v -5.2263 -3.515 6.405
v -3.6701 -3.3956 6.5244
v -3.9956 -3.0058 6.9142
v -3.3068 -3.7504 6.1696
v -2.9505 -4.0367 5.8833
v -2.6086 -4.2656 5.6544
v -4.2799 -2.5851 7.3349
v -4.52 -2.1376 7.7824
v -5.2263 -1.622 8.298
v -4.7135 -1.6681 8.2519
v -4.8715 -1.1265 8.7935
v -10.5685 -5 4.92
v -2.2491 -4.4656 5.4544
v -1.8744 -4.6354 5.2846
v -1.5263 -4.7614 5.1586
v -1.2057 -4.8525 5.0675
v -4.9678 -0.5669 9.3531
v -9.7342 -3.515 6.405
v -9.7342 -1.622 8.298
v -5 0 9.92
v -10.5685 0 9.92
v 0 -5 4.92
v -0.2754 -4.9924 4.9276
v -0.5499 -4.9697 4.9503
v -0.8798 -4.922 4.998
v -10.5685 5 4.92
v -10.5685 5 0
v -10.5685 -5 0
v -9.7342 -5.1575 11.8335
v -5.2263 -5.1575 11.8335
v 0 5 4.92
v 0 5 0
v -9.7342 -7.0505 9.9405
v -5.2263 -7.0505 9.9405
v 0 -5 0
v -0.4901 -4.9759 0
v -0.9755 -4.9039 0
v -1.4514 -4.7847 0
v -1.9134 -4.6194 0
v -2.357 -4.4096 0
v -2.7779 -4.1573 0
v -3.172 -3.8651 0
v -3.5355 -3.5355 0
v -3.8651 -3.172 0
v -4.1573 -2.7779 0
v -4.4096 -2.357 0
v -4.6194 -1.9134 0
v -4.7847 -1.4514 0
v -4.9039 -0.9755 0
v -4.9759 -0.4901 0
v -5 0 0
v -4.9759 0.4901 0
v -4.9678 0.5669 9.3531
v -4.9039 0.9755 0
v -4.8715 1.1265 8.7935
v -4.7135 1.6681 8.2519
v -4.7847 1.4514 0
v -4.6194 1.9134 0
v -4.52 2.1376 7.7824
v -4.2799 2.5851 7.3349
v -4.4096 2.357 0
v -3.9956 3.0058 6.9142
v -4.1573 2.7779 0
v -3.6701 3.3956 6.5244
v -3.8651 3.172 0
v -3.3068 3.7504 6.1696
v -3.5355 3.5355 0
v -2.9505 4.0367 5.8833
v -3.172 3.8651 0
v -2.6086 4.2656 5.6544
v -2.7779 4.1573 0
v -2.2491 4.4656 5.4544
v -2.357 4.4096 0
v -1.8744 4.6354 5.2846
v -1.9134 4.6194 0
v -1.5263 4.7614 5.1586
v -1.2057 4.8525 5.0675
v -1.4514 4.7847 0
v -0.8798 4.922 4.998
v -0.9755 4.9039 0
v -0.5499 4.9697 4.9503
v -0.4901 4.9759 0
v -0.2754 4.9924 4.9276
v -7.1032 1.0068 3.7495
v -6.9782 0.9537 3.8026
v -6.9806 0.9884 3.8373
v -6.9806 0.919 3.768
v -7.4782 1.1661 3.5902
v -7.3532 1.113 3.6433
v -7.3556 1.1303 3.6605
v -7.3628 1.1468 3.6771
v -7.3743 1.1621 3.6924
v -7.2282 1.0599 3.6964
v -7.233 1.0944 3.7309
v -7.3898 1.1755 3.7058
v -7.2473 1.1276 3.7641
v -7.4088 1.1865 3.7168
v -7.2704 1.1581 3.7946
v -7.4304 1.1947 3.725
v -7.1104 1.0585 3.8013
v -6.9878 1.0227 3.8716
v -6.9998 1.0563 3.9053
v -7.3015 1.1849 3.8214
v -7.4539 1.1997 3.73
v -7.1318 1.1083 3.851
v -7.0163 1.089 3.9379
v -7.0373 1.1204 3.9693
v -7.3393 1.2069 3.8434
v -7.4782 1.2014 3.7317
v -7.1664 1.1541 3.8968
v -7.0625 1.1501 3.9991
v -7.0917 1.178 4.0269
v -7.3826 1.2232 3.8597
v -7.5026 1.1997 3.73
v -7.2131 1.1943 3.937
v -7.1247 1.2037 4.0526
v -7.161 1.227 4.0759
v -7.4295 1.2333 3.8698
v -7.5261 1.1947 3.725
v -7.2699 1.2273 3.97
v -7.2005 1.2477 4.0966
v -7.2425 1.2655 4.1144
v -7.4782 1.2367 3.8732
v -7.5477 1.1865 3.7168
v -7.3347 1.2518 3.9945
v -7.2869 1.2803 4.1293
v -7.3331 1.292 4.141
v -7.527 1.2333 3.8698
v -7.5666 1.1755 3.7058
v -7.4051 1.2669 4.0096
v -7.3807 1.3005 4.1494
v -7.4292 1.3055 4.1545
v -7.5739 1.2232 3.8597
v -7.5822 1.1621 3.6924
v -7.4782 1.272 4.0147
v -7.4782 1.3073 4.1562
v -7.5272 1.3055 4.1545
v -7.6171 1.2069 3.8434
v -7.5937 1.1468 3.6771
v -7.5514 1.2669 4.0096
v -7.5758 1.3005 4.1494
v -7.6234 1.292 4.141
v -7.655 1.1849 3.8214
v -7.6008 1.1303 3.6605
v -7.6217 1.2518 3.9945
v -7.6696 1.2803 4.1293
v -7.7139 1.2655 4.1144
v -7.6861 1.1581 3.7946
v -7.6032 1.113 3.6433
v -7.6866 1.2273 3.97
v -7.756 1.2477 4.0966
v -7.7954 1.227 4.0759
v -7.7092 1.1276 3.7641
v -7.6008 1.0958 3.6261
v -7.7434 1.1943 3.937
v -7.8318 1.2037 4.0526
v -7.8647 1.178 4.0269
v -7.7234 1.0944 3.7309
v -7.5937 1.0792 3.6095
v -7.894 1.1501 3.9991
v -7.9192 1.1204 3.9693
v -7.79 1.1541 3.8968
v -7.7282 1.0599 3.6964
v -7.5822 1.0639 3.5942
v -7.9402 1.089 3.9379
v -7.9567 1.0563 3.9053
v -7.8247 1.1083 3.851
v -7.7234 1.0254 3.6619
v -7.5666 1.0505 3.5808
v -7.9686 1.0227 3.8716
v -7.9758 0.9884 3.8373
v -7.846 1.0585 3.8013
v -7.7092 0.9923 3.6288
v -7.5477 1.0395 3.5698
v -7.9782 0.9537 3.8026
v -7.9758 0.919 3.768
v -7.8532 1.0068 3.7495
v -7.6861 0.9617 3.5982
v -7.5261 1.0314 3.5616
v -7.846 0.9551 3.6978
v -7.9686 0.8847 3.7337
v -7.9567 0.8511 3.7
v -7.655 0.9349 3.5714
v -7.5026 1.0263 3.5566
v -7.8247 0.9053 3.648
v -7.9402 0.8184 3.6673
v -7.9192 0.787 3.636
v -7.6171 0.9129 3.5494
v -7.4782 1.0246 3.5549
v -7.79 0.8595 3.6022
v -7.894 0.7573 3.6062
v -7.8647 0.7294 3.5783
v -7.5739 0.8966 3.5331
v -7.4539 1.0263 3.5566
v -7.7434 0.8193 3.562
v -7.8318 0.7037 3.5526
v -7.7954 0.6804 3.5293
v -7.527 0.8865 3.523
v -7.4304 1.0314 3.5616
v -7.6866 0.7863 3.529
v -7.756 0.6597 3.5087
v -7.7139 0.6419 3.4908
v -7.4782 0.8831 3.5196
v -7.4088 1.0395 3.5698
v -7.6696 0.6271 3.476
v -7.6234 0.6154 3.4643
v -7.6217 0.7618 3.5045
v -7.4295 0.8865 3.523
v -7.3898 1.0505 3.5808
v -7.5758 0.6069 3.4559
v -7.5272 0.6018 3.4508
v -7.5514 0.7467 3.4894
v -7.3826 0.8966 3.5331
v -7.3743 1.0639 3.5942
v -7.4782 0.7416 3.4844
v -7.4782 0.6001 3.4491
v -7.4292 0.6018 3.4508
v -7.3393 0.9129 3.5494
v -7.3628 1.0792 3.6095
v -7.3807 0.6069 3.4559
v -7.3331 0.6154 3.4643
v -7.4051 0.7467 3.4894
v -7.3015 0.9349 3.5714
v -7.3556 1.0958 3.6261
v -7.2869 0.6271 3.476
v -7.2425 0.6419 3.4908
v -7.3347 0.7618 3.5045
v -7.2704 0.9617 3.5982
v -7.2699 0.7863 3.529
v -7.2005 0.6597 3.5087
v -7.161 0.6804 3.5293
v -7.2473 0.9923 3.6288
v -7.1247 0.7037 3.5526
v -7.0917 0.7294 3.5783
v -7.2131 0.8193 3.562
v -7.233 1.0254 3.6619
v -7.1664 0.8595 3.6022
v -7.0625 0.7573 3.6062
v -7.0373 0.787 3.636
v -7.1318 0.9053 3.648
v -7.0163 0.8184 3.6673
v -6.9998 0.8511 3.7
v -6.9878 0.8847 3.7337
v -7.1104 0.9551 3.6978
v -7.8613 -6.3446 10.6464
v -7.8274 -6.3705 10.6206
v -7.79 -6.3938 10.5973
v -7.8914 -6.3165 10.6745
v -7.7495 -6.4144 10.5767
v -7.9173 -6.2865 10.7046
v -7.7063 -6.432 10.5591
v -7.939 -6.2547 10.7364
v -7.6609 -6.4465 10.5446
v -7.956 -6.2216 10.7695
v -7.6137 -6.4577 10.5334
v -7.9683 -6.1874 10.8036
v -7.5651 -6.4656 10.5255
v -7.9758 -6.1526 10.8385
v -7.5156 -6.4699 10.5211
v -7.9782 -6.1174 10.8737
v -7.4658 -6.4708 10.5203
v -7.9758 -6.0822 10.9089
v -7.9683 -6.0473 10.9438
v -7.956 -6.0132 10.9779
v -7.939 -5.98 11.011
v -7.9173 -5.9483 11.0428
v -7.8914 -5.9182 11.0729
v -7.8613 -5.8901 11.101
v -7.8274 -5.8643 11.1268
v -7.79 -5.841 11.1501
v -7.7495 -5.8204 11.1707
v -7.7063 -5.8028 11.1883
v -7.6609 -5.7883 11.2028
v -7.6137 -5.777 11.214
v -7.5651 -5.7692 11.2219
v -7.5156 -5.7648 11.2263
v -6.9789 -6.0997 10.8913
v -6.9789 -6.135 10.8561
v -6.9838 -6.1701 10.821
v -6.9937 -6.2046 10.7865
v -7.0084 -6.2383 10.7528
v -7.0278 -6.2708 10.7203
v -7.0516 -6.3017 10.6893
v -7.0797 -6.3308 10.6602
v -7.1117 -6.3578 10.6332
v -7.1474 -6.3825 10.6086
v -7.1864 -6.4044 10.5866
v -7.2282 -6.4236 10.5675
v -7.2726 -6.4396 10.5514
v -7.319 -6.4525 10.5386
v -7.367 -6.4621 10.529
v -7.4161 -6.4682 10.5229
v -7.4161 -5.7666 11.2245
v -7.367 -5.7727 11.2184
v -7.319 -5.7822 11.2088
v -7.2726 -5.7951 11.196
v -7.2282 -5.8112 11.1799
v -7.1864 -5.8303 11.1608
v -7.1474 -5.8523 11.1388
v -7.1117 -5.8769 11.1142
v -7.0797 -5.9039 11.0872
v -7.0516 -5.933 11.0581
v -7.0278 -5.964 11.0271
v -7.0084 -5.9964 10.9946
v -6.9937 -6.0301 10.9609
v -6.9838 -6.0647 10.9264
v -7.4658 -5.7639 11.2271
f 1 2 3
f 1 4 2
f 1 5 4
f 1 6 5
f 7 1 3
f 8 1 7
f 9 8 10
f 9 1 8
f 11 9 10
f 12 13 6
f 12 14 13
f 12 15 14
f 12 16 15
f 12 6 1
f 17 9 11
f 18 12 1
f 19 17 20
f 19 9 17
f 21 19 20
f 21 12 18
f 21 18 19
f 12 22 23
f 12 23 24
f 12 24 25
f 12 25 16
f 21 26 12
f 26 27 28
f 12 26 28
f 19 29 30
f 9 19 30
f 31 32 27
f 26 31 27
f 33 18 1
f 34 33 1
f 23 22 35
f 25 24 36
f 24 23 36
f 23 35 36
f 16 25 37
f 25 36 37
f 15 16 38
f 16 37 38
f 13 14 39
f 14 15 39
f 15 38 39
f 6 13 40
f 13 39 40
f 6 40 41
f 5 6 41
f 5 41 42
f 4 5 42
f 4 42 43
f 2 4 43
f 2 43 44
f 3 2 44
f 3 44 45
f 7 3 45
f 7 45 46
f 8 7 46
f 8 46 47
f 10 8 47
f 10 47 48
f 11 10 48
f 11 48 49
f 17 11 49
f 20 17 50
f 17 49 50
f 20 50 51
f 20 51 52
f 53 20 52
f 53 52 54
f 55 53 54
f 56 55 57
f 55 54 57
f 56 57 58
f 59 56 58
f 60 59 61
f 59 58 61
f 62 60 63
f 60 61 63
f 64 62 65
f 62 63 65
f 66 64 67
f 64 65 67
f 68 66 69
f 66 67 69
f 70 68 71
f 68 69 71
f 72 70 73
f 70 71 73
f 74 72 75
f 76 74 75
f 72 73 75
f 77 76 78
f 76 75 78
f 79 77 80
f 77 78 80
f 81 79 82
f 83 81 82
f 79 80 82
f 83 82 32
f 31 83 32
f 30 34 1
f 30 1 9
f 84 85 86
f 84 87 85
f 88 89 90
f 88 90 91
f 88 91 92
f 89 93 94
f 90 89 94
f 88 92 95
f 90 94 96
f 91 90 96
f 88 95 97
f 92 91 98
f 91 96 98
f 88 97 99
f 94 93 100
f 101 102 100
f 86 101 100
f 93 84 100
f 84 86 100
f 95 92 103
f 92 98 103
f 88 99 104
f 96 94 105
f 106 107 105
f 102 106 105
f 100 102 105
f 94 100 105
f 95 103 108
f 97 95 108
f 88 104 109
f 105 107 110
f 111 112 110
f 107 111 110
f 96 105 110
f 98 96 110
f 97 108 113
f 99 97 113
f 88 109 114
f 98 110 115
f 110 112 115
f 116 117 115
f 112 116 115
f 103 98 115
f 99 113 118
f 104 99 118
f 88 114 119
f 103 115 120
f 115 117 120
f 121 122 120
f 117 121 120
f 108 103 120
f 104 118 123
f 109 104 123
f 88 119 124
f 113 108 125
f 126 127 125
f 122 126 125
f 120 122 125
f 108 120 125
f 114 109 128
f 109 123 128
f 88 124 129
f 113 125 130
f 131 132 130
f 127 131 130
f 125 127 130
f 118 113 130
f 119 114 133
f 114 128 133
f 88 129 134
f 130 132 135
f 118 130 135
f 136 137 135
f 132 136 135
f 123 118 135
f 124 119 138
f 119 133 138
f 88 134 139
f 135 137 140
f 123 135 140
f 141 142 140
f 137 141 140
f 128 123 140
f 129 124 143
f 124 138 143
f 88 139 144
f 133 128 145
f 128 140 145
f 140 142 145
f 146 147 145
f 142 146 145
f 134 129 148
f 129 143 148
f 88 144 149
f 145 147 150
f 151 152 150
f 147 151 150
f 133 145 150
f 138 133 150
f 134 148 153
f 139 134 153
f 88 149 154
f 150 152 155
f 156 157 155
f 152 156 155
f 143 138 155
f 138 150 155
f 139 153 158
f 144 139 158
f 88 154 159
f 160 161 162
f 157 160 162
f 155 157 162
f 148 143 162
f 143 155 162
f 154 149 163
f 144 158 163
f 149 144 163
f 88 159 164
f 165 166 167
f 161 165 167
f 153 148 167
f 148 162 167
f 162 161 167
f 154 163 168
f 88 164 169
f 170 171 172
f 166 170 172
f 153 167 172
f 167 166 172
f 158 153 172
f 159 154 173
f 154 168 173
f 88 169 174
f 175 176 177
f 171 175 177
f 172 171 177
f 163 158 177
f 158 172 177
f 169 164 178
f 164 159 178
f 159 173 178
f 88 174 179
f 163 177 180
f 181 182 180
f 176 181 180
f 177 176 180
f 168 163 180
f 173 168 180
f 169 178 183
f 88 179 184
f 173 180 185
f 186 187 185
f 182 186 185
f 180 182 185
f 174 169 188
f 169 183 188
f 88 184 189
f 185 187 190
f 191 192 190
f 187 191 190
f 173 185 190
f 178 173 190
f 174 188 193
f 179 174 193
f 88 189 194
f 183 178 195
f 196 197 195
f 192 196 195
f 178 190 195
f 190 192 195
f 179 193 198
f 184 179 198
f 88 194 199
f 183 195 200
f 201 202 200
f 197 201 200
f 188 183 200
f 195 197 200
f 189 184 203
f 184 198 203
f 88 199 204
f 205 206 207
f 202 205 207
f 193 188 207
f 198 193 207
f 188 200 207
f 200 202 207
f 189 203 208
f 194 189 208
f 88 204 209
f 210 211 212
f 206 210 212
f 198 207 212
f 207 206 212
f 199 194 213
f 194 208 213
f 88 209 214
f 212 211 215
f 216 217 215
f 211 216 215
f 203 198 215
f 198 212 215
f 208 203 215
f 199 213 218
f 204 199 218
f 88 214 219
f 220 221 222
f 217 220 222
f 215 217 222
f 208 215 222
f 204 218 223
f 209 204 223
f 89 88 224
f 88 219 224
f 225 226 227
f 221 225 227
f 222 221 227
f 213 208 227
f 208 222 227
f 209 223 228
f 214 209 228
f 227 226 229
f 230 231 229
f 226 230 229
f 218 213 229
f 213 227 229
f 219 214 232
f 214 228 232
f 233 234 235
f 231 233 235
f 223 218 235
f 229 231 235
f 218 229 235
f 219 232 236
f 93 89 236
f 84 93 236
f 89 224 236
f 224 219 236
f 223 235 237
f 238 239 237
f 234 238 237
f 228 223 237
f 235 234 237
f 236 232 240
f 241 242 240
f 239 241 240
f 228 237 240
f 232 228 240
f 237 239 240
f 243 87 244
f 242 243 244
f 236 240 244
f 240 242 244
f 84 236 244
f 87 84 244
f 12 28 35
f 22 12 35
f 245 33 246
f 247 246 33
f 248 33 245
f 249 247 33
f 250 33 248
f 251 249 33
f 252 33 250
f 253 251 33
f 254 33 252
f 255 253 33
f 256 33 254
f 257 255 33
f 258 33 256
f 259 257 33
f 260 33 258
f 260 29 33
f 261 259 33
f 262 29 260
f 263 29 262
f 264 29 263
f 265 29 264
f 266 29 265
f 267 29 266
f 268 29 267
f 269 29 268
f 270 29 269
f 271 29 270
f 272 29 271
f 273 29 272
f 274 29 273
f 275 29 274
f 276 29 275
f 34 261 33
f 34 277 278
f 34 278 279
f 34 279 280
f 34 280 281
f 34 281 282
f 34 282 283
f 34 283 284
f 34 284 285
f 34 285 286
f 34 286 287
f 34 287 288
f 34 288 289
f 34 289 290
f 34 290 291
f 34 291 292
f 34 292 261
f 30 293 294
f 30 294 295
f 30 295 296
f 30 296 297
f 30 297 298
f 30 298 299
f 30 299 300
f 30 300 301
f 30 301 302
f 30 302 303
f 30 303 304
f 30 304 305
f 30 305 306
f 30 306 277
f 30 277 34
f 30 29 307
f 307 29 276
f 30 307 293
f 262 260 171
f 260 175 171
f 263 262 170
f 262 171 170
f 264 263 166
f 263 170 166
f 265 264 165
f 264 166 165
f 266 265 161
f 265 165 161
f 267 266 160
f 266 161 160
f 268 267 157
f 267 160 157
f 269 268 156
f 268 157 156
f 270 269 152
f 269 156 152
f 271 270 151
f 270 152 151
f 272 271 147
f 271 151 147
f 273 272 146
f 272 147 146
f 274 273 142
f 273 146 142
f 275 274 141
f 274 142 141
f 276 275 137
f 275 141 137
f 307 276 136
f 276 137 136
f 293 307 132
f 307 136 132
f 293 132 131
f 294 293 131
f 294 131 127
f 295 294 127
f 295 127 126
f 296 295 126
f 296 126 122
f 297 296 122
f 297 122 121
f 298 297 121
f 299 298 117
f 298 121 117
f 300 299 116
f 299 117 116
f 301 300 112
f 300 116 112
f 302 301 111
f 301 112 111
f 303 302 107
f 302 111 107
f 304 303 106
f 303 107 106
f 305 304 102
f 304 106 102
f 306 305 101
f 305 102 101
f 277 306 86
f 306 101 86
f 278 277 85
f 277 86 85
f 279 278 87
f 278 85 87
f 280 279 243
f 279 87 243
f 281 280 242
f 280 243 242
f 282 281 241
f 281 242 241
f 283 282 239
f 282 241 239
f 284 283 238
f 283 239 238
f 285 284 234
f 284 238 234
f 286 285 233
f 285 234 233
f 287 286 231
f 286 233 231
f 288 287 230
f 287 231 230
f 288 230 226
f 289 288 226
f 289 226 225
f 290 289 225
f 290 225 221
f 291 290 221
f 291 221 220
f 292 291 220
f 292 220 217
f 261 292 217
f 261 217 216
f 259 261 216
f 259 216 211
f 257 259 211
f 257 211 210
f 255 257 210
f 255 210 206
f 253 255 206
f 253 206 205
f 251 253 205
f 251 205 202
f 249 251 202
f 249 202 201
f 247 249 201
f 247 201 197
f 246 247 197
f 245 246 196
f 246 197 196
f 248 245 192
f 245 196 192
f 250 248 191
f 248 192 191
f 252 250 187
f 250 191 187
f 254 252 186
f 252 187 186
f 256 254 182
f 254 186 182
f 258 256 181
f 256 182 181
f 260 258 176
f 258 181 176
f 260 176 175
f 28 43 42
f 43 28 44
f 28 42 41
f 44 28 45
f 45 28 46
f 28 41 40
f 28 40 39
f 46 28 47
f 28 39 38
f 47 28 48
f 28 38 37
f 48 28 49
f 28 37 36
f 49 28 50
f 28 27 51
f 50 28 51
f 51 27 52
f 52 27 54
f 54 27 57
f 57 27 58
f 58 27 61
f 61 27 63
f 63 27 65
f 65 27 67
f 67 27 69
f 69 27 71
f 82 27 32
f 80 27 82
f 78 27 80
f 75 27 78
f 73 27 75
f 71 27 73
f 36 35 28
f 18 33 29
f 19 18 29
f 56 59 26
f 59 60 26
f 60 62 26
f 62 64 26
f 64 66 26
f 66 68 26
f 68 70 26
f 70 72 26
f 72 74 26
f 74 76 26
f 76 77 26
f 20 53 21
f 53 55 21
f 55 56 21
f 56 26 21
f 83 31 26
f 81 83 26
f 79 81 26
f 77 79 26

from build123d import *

# Parameters (mm, degrees)
F1_DEPTH    = 10
F2_T1_DEPTH = 36.6968120455
F3_W        = 4.5079379342
F3_H        = 2.6771172415
F4_DEPTH    = 5
F6_D        = 1
F6_DEPTH    = 10
F6_TIP      = 0.3004303095


# Not quite as in the source:
# - a fillet or chamfer that OpenCascade refuses, or shapes differently, is made with other operations: its cross-section is extruded or revolved along the edge and cut away or added


with BuildPart() as f1:
    # F0 (on Top) → F1 (new body)
    with BuildSketch(Plane.XY):
        with BuildLine():
            ThreePointArc((0, -5), (-5, 0), (0, 5))
            Line((0, 5), (-10.5685128878, 5))
            Line((-10.5685128878, 5), (-10.5685128878, -5))
            Line((-10.5685128878, -5), (0, -5))
        make_face()
    extrude(amount=F1_DEPTH)

    # F2: chamfer of 5.08 on 2 edges, made by hand

    # F2_s2 → F2_t1 (cut)
    with BuildSketch(Plane.YZ.offset(-23.6326624666)):
        Polygon((-5, 4.92), (0.08, 10), (-5, 10), align=None)
        Polygon((5, 4.92), (-0.08, 10), (5, 10), align=None)
    extrude(amount=F2_T1_DEPTH, mode=Mode.SUBTRACT)

    # F3 (on face) → F4 (join)
    with BuildSketch(Plane(origin=(0, -4.96, 4.96), x_dir=(1, 0, 0), z_dir=(0, -0.7071067812, 0.7071067812))):
        with Locations((-7.4802257586, 3.3821087563)):
            Rectangle(F3_W, F3_H)
    extrude(amount=F4_DEPTH)

    # F6
    with Locations(Plane(origin=(0, -8.4955339059, 8.4955339059), x_dir=(1, 0, 0), z_dir=(0, -0.7071067812, 0.7071067812))):
        with Locations((-7.4782376178, 3.3632300328)):
            Hole(F6_D / 2, depth=F6_DEPTH)
            with Locations((0, 0, -(F6_DEPTH + F6_TIP / 2))):  # 118° drill point
                Cone(0, F6_D / 2, F6_TIP, mode=Mode.SUBTRACT)


solid = f1.part
